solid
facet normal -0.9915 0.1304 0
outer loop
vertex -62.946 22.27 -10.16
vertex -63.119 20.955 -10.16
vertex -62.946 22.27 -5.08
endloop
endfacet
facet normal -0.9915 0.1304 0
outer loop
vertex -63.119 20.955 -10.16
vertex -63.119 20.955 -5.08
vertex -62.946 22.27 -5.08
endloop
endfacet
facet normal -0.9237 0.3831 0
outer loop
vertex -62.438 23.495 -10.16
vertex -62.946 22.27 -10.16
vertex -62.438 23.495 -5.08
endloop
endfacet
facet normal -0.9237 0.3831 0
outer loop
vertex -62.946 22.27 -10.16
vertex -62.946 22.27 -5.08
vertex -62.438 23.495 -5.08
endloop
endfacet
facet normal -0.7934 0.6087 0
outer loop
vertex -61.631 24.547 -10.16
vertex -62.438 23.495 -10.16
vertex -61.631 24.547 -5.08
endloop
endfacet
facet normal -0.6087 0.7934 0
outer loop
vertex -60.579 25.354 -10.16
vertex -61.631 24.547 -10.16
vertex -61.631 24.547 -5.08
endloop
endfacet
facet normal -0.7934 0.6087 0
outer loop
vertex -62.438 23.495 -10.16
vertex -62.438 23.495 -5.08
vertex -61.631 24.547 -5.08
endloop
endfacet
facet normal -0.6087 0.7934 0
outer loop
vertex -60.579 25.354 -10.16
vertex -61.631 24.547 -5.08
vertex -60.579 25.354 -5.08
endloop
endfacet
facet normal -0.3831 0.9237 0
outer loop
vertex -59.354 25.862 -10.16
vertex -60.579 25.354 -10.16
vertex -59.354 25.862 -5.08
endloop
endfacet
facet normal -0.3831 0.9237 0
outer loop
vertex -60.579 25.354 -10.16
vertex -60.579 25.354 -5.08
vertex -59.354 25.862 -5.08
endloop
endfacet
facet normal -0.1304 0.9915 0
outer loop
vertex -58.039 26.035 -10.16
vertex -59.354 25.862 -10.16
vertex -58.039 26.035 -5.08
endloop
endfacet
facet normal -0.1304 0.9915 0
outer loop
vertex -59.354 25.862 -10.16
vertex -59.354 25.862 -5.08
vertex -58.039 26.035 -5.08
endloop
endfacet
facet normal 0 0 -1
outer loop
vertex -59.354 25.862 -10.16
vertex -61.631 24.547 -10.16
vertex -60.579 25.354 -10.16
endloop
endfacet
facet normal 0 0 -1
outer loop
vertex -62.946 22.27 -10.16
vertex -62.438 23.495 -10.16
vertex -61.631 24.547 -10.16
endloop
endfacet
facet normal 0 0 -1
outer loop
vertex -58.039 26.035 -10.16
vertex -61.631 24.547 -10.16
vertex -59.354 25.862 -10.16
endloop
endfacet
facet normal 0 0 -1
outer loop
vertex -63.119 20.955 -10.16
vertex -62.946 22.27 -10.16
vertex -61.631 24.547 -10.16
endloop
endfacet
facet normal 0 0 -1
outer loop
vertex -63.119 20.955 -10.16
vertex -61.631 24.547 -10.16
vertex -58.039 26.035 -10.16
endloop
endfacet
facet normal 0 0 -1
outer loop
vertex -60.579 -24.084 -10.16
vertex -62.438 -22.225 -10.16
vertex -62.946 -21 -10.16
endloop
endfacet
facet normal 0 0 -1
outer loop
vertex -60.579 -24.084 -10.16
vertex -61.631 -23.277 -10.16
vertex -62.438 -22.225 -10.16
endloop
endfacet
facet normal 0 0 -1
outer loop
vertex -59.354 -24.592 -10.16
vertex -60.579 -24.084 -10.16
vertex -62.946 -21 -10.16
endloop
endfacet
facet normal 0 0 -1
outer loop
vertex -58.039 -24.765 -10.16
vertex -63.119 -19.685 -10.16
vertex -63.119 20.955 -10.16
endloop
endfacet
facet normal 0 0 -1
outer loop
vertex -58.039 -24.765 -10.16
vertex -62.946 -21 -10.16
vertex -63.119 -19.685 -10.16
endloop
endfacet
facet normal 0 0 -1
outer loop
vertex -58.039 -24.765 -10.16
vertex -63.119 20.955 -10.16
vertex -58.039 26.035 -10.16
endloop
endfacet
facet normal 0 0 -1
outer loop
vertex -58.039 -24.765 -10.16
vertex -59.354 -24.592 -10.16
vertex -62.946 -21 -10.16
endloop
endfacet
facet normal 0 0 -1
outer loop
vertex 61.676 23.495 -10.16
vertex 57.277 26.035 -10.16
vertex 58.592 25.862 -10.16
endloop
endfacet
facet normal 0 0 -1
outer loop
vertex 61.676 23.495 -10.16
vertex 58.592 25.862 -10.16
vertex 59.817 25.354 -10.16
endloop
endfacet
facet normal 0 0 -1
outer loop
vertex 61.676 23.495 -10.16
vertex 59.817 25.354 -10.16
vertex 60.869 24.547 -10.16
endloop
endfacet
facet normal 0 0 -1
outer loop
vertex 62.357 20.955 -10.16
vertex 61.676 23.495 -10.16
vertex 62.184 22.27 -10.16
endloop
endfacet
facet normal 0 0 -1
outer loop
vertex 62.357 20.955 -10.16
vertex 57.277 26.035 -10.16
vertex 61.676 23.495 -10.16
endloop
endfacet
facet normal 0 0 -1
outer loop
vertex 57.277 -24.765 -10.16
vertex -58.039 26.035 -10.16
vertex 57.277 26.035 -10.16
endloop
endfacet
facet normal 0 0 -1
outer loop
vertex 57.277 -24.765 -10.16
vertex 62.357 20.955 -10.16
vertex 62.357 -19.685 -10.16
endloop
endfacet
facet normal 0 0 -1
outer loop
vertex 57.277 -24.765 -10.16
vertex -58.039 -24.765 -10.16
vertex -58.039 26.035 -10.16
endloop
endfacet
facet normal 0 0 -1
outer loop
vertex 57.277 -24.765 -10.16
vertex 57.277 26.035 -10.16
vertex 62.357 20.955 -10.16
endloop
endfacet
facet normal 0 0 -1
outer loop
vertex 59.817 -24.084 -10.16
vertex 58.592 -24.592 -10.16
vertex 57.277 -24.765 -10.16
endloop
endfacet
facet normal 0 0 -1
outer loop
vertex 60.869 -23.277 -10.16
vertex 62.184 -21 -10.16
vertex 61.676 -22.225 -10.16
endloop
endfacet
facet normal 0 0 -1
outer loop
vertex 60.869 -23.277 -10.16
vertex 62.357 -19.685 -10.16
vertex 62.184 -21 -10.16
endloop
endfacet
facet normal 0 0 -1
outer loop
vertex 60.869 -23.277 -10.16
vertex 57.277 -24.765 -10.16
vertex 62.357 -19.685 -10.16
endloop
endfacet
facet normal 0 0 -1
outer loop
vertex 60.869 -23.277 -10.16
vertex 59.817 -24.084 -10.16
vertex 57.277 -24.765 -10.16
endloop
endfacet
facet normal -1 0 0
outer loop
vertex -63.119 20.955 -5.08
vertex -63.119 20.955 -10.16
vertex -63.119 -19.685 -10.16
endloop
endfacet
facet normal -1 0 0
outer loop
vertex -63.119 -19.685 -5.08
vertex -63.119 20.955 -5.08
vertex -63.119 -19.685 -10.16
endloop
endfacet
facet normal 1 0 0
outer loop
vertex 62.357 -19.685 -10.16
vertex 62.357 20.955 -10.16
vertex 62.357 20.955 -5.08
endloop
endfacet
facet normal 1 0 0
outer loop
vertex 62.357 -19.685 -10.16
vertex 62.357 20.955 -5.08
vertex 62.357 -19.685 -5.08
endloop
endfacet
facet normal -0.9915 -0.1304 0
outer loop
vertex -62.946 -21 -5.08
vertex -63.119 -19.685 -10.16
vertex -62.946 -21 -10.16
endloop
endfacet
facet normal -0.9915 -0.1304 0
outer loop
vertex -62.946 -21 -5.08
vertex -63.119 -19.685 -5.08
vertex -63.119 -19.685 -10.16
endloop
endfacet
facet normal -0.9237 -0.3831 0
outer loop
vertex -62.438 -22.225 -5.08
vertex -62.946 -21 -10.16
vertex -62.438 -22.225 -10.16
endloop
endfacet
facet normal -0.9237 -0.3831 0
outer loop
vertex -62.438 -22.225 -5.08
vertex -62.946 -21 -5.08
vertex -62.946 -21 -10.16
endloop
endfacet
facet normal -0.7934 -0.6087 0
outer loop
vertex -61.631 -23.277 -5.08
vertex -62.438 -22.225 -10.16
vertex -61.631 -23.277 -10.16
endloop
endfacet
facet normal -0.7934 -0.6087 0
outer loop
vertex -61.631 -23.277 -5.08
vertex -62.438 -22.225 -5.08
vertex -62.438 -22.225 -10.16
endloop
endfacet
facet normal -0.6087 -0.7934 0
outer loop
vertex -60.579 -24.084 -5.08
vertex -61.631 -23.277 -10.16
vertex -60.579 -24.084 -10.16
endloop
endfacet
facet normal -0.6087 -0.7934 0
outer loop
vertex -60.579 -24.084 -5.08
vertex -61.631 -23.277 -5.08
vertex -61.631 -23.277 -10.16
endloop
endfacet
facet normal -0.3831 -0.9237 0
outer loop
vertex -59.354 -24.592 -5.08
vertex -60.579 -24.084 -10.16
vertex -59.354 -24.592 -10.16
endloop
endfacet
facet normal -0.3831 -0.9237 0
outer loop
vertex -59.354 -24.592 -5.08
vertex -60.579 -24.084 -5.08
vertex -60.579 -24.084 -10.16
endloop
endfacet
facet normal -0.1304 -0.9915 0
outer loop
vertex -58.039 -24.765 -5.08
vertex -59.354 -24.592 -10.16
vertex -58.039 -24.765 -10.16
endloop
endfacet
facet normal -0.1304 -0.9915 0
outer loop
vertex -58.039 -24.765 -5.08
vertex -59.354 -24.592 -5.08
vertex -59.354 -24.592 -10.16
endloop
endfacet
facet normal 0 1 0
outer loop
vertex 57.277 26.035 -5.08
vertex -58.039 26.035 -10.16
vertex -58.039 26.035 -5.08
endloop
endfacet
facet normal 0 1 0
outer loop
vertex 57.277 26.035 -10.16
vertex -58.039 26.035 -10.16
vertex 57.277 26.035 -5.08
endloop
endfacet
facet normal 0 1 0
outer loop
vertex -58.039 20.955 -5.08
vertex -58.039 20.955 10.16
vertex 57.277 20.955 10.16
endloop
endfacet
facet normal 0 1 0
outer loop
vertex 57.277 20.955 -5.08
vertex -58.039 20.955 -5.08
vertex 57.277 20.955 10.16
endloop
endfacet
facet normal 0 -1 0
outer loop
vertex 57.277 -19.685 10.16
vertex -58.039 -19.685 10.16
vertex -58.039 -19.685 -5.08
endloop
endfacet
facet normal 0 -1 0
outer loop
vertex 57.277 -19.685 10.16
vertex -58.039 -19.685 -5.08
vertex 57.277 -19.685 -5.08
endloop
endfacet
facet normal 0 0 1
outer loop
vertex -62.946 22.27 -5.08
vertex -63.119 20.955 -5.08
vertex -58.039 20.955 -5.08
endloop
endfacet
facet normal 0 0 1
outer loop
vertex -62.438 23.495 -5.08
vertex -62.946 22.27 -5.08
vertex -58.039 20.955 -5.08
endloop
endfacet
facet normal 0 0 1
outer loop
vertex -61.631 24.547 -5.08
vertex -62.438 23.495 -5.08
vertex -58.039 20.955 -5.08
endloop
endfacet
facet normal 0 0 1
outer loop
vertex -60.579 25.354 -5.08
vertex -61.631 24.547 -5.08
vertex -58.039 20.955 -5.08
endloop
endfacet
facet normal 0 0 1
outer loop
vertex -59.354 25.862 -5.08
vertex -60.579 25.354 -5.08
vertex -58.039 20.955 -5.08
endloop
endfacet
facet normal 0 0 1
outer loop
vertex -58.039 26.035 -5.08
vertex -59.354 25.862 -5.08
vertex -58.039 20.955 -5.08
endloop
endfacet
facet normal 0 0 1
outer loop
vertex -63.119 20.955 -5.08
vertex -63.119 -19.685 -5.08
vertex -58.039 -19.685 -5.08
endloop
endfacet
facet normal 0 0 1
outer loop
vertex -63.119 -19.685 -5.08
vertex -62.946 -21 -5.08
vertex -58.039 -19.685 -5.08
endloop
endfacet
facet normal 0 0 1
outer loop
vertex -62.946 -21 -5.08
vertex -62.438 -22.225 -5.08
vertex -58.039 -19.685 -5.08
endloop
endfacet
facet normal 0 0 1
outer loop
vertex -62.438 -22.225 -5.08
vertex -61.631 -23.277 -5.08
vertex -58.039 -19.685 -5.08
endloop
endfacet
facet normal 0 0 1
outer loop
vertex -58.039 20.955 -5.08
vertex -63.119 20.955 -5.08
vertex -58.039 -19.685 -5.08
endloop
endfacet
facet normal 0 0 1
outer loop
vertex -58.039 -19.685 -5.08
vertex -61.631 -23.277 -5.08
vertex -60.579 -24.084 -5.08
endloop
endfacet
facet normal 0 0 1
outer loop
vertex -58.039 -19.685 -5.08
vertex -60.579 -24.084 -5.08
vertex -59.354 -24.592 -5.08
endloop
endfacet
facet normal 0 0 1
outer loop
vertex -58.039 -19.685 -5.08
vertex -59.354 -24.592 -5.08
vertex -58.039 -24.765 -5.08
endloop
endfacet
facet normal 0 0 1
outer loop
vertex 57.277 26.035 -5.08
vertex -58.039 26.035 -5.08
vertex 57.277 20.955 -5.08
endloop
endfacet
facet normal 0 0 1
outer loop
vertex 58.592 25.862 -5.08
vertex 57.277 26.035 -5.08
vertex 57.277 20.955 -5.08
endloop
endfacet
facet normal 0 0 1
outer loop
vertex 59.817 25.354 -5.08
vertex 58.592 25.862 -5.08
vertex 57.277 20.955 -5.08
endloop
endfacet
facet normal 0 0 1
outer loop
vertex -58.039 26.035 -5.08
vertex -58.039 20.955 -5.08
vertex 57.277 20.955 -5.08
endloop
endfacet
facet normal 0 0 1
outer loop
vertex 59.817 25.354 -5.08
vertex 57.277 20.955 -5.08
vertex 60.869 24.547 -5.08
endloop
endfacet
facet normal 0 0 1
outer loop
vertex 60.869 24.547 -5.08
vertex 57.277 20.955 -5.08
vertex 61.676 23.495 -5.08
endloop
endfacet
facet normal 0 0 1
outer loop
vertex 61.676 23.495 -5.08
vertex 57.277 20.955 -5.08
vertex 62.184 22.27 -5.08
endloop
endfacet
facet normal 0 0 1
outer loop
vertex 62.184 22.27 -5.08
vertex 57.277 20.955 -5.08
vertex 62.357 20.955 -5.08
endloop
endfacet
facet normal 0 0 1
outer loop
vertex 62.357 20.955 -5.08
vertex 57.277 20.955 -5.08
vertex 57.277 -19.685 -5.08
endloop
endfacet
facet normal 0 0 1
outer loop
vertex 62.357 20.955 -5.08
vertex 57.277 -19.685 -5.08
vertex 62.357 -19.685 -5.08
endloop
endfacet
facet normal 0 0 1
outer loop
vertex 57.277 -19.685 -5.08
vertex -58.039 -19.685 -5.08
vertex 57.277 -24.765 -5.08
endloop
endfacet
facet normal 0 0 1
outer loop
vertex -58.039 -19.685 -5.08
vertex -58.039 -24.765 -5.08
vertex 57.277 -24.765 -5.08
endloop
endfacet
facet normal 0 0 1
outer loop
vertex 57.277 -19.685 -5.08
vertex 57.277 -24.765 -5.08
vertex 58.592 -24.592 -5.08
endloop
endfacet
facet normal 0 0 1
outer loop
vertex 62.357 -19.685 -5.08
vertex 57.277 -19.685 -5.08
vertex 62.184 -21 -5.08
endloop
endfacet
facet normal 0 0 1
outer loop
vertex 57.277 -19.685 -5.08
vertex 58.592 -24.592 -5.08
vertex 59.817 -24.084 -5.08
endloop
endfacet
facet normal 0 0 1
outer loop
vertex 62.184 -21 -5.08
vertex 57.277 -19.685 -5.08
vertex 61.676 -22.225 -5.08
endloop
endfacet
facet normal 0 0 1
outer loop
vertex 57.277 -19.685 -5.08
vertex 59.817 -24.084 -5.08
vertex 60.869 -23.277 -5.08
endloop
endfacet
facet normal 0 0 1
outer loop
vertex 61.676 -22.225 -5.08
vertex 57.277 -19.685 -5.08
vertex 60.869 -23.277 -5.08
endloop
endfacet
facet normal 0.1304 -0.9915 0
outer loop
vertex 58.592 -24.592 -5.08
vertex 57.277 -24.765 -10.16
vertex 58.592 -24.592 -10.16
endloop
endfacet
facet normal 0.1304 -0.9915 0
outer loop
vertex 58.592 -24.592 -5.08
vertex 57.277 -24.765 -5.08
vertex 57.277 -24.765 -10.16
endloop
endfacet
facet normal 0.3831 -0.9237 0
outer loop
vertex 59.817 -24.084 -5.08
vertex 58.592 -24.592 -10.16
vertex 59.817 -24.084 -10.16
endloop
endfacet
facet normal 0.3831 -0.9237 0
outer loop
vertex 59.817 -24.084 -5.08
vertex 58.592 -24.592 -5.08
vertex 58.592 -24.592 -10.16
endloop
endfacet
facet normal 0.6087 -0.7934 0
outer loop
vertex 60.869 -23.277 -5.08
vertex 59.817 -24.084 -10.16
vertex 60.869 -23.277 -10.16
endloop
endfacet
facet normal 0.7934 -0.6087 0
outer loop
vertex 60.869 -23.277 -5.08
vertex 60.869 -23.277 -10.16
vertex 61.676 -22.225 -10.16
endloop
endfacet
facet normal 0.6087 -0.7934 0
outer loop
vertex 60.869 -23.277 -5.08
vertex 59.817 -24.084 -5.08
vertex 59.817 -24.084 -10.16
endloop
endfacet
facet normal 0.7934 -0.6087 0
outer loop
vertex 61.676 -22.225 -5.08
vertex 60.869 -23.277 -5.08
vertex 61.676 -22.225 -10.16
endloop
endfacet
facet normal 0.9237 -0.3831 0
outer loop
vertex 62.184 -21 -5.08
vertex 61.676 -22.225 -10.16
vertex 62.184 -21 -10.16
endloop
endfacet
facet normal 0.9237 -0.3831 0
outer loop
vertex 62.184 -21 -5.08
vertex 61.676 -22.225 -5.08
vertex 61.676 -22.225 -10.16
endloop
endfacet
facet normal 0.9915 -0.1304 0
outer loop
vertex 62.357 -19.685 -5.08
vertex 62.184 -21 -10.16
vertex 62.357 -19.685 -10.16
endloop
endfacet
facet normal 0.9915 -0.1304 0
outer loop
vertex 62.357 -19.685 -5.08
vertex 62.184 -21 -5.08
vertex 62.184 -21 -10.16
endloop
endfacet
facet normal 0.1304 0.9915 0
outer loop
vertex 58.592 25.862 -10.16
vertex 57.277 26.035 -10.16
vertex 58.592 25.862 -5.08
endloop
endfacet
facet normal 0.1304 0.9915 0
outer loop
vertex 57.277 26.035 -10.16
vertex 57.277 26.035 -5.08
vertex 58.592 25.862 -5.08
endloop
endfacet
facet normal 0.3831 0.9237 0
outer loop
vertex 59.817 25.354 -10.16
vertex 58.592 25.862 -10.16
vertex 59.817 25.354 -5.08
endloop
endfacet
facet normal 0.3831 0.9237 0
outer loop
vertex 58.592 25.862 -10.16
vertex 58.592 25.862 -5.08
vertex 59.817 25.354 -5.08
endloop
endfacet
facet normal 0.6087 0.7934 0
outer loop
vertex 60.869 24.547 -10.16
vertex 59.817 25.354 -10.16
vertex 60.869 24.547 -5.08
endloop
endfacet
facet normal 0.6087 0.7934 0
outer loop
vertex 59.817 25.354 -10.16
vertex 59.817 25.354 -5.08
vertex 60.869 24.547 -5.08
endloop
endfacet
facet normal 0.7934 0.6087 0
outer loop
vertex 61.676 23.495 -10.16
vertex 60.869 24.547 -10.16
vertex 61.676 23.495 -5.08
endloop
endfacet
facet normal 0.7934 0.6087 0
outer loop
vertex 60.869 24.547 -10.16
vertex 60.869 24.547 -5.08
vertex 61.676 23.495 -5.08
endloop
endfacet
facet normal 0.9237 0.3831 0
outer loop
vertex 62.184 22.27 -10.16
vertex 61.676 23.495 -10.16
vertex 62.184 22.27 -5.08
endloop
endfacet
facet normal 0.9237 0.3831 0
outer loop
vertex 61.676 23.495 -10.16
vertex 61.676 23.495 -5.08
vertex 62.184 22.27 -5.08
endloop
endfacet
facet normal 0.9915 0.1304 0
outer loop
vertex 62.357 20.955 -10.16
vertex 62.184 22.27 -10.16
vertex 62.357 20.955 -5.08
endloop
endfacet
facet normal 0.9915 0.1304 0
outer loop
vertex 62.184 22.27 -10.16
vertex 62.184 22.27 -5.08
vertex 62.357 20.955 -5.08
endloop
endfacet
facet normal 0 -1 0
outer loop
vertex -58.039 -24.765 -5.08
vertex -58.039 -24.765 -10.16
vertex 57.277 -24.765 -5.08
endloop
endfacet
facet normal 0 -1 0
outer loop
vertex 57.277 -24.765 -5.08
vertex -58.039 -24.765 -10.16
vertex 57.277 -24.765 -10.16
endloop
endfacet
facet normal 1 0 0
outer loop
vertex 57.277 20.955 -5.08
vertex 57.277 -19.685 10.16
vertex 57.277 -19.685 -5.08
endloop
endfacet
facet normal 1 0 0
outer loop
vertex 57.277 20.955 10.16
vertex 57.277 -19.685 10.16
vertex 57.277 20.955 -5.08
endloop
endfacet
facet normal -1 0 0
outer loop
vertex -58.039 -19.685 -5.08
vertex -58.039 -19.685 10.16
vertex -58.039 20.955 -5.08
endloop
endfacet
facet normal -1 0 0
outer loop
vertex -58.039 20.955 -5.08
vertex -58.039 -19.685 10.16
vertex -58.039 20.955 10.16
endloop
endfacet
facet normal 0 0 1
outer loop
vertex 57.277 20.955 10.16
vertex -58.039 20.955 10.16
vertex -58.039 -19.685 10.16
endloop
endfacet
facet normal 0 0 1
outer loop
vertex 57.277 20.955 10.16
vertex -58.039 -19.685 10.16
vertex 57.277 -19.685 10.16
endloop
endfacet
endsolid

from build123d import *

# Parameters (mm, degrees)
F0_W     = 115.316
F0_H     = 40.64
F1_DEPTH = 10.16
F2_W     = 125.476
F2_H     = 50.8
F2_W_2   = 115.316
F2_H_2   = 40.64
F3_DEPTH = 5.08
F4_R     = 5.08


with BuildPart() as f1:
    # F0 (on Top) → F1 (new body, symmetric)
    with BuildSketch(Plane.XY):
        with Locations((-0.381, 0.635)):
            Rectangle(F0_W, F0_H)
    extrude(amount=F1_DEPTH, both=True)

    # F2 (on face) → F3 (join)
    with BuildSketch(Plane(origin=(0, 0, -10.16), x_dir=(1, 0, 0), z_dir=(0, 0, -1))):
        with Locations((-0.381, -0.635)):
            Rectangle(F2_W, F2_H)
        with Locations((-0.381, -0.635)):
            Rectangle(F2_W_2, F2_H_2, mode=Mode.SUBTRACT)
    extrude(amount=-F3_DEPTH)

    # F4
    f4_edges = [f1.edges().sort_by_distance(p)[0] for p in [
        (-63.119, -24.765, -7.62),
        (62.357, -24.765, -7.62),
        (-63.119, 26.035, -7.62),
        (62.357, 26.035, -7.62),
    ]]
    fillet(f4_edges, radius=F4_R)


solid = f1.part
